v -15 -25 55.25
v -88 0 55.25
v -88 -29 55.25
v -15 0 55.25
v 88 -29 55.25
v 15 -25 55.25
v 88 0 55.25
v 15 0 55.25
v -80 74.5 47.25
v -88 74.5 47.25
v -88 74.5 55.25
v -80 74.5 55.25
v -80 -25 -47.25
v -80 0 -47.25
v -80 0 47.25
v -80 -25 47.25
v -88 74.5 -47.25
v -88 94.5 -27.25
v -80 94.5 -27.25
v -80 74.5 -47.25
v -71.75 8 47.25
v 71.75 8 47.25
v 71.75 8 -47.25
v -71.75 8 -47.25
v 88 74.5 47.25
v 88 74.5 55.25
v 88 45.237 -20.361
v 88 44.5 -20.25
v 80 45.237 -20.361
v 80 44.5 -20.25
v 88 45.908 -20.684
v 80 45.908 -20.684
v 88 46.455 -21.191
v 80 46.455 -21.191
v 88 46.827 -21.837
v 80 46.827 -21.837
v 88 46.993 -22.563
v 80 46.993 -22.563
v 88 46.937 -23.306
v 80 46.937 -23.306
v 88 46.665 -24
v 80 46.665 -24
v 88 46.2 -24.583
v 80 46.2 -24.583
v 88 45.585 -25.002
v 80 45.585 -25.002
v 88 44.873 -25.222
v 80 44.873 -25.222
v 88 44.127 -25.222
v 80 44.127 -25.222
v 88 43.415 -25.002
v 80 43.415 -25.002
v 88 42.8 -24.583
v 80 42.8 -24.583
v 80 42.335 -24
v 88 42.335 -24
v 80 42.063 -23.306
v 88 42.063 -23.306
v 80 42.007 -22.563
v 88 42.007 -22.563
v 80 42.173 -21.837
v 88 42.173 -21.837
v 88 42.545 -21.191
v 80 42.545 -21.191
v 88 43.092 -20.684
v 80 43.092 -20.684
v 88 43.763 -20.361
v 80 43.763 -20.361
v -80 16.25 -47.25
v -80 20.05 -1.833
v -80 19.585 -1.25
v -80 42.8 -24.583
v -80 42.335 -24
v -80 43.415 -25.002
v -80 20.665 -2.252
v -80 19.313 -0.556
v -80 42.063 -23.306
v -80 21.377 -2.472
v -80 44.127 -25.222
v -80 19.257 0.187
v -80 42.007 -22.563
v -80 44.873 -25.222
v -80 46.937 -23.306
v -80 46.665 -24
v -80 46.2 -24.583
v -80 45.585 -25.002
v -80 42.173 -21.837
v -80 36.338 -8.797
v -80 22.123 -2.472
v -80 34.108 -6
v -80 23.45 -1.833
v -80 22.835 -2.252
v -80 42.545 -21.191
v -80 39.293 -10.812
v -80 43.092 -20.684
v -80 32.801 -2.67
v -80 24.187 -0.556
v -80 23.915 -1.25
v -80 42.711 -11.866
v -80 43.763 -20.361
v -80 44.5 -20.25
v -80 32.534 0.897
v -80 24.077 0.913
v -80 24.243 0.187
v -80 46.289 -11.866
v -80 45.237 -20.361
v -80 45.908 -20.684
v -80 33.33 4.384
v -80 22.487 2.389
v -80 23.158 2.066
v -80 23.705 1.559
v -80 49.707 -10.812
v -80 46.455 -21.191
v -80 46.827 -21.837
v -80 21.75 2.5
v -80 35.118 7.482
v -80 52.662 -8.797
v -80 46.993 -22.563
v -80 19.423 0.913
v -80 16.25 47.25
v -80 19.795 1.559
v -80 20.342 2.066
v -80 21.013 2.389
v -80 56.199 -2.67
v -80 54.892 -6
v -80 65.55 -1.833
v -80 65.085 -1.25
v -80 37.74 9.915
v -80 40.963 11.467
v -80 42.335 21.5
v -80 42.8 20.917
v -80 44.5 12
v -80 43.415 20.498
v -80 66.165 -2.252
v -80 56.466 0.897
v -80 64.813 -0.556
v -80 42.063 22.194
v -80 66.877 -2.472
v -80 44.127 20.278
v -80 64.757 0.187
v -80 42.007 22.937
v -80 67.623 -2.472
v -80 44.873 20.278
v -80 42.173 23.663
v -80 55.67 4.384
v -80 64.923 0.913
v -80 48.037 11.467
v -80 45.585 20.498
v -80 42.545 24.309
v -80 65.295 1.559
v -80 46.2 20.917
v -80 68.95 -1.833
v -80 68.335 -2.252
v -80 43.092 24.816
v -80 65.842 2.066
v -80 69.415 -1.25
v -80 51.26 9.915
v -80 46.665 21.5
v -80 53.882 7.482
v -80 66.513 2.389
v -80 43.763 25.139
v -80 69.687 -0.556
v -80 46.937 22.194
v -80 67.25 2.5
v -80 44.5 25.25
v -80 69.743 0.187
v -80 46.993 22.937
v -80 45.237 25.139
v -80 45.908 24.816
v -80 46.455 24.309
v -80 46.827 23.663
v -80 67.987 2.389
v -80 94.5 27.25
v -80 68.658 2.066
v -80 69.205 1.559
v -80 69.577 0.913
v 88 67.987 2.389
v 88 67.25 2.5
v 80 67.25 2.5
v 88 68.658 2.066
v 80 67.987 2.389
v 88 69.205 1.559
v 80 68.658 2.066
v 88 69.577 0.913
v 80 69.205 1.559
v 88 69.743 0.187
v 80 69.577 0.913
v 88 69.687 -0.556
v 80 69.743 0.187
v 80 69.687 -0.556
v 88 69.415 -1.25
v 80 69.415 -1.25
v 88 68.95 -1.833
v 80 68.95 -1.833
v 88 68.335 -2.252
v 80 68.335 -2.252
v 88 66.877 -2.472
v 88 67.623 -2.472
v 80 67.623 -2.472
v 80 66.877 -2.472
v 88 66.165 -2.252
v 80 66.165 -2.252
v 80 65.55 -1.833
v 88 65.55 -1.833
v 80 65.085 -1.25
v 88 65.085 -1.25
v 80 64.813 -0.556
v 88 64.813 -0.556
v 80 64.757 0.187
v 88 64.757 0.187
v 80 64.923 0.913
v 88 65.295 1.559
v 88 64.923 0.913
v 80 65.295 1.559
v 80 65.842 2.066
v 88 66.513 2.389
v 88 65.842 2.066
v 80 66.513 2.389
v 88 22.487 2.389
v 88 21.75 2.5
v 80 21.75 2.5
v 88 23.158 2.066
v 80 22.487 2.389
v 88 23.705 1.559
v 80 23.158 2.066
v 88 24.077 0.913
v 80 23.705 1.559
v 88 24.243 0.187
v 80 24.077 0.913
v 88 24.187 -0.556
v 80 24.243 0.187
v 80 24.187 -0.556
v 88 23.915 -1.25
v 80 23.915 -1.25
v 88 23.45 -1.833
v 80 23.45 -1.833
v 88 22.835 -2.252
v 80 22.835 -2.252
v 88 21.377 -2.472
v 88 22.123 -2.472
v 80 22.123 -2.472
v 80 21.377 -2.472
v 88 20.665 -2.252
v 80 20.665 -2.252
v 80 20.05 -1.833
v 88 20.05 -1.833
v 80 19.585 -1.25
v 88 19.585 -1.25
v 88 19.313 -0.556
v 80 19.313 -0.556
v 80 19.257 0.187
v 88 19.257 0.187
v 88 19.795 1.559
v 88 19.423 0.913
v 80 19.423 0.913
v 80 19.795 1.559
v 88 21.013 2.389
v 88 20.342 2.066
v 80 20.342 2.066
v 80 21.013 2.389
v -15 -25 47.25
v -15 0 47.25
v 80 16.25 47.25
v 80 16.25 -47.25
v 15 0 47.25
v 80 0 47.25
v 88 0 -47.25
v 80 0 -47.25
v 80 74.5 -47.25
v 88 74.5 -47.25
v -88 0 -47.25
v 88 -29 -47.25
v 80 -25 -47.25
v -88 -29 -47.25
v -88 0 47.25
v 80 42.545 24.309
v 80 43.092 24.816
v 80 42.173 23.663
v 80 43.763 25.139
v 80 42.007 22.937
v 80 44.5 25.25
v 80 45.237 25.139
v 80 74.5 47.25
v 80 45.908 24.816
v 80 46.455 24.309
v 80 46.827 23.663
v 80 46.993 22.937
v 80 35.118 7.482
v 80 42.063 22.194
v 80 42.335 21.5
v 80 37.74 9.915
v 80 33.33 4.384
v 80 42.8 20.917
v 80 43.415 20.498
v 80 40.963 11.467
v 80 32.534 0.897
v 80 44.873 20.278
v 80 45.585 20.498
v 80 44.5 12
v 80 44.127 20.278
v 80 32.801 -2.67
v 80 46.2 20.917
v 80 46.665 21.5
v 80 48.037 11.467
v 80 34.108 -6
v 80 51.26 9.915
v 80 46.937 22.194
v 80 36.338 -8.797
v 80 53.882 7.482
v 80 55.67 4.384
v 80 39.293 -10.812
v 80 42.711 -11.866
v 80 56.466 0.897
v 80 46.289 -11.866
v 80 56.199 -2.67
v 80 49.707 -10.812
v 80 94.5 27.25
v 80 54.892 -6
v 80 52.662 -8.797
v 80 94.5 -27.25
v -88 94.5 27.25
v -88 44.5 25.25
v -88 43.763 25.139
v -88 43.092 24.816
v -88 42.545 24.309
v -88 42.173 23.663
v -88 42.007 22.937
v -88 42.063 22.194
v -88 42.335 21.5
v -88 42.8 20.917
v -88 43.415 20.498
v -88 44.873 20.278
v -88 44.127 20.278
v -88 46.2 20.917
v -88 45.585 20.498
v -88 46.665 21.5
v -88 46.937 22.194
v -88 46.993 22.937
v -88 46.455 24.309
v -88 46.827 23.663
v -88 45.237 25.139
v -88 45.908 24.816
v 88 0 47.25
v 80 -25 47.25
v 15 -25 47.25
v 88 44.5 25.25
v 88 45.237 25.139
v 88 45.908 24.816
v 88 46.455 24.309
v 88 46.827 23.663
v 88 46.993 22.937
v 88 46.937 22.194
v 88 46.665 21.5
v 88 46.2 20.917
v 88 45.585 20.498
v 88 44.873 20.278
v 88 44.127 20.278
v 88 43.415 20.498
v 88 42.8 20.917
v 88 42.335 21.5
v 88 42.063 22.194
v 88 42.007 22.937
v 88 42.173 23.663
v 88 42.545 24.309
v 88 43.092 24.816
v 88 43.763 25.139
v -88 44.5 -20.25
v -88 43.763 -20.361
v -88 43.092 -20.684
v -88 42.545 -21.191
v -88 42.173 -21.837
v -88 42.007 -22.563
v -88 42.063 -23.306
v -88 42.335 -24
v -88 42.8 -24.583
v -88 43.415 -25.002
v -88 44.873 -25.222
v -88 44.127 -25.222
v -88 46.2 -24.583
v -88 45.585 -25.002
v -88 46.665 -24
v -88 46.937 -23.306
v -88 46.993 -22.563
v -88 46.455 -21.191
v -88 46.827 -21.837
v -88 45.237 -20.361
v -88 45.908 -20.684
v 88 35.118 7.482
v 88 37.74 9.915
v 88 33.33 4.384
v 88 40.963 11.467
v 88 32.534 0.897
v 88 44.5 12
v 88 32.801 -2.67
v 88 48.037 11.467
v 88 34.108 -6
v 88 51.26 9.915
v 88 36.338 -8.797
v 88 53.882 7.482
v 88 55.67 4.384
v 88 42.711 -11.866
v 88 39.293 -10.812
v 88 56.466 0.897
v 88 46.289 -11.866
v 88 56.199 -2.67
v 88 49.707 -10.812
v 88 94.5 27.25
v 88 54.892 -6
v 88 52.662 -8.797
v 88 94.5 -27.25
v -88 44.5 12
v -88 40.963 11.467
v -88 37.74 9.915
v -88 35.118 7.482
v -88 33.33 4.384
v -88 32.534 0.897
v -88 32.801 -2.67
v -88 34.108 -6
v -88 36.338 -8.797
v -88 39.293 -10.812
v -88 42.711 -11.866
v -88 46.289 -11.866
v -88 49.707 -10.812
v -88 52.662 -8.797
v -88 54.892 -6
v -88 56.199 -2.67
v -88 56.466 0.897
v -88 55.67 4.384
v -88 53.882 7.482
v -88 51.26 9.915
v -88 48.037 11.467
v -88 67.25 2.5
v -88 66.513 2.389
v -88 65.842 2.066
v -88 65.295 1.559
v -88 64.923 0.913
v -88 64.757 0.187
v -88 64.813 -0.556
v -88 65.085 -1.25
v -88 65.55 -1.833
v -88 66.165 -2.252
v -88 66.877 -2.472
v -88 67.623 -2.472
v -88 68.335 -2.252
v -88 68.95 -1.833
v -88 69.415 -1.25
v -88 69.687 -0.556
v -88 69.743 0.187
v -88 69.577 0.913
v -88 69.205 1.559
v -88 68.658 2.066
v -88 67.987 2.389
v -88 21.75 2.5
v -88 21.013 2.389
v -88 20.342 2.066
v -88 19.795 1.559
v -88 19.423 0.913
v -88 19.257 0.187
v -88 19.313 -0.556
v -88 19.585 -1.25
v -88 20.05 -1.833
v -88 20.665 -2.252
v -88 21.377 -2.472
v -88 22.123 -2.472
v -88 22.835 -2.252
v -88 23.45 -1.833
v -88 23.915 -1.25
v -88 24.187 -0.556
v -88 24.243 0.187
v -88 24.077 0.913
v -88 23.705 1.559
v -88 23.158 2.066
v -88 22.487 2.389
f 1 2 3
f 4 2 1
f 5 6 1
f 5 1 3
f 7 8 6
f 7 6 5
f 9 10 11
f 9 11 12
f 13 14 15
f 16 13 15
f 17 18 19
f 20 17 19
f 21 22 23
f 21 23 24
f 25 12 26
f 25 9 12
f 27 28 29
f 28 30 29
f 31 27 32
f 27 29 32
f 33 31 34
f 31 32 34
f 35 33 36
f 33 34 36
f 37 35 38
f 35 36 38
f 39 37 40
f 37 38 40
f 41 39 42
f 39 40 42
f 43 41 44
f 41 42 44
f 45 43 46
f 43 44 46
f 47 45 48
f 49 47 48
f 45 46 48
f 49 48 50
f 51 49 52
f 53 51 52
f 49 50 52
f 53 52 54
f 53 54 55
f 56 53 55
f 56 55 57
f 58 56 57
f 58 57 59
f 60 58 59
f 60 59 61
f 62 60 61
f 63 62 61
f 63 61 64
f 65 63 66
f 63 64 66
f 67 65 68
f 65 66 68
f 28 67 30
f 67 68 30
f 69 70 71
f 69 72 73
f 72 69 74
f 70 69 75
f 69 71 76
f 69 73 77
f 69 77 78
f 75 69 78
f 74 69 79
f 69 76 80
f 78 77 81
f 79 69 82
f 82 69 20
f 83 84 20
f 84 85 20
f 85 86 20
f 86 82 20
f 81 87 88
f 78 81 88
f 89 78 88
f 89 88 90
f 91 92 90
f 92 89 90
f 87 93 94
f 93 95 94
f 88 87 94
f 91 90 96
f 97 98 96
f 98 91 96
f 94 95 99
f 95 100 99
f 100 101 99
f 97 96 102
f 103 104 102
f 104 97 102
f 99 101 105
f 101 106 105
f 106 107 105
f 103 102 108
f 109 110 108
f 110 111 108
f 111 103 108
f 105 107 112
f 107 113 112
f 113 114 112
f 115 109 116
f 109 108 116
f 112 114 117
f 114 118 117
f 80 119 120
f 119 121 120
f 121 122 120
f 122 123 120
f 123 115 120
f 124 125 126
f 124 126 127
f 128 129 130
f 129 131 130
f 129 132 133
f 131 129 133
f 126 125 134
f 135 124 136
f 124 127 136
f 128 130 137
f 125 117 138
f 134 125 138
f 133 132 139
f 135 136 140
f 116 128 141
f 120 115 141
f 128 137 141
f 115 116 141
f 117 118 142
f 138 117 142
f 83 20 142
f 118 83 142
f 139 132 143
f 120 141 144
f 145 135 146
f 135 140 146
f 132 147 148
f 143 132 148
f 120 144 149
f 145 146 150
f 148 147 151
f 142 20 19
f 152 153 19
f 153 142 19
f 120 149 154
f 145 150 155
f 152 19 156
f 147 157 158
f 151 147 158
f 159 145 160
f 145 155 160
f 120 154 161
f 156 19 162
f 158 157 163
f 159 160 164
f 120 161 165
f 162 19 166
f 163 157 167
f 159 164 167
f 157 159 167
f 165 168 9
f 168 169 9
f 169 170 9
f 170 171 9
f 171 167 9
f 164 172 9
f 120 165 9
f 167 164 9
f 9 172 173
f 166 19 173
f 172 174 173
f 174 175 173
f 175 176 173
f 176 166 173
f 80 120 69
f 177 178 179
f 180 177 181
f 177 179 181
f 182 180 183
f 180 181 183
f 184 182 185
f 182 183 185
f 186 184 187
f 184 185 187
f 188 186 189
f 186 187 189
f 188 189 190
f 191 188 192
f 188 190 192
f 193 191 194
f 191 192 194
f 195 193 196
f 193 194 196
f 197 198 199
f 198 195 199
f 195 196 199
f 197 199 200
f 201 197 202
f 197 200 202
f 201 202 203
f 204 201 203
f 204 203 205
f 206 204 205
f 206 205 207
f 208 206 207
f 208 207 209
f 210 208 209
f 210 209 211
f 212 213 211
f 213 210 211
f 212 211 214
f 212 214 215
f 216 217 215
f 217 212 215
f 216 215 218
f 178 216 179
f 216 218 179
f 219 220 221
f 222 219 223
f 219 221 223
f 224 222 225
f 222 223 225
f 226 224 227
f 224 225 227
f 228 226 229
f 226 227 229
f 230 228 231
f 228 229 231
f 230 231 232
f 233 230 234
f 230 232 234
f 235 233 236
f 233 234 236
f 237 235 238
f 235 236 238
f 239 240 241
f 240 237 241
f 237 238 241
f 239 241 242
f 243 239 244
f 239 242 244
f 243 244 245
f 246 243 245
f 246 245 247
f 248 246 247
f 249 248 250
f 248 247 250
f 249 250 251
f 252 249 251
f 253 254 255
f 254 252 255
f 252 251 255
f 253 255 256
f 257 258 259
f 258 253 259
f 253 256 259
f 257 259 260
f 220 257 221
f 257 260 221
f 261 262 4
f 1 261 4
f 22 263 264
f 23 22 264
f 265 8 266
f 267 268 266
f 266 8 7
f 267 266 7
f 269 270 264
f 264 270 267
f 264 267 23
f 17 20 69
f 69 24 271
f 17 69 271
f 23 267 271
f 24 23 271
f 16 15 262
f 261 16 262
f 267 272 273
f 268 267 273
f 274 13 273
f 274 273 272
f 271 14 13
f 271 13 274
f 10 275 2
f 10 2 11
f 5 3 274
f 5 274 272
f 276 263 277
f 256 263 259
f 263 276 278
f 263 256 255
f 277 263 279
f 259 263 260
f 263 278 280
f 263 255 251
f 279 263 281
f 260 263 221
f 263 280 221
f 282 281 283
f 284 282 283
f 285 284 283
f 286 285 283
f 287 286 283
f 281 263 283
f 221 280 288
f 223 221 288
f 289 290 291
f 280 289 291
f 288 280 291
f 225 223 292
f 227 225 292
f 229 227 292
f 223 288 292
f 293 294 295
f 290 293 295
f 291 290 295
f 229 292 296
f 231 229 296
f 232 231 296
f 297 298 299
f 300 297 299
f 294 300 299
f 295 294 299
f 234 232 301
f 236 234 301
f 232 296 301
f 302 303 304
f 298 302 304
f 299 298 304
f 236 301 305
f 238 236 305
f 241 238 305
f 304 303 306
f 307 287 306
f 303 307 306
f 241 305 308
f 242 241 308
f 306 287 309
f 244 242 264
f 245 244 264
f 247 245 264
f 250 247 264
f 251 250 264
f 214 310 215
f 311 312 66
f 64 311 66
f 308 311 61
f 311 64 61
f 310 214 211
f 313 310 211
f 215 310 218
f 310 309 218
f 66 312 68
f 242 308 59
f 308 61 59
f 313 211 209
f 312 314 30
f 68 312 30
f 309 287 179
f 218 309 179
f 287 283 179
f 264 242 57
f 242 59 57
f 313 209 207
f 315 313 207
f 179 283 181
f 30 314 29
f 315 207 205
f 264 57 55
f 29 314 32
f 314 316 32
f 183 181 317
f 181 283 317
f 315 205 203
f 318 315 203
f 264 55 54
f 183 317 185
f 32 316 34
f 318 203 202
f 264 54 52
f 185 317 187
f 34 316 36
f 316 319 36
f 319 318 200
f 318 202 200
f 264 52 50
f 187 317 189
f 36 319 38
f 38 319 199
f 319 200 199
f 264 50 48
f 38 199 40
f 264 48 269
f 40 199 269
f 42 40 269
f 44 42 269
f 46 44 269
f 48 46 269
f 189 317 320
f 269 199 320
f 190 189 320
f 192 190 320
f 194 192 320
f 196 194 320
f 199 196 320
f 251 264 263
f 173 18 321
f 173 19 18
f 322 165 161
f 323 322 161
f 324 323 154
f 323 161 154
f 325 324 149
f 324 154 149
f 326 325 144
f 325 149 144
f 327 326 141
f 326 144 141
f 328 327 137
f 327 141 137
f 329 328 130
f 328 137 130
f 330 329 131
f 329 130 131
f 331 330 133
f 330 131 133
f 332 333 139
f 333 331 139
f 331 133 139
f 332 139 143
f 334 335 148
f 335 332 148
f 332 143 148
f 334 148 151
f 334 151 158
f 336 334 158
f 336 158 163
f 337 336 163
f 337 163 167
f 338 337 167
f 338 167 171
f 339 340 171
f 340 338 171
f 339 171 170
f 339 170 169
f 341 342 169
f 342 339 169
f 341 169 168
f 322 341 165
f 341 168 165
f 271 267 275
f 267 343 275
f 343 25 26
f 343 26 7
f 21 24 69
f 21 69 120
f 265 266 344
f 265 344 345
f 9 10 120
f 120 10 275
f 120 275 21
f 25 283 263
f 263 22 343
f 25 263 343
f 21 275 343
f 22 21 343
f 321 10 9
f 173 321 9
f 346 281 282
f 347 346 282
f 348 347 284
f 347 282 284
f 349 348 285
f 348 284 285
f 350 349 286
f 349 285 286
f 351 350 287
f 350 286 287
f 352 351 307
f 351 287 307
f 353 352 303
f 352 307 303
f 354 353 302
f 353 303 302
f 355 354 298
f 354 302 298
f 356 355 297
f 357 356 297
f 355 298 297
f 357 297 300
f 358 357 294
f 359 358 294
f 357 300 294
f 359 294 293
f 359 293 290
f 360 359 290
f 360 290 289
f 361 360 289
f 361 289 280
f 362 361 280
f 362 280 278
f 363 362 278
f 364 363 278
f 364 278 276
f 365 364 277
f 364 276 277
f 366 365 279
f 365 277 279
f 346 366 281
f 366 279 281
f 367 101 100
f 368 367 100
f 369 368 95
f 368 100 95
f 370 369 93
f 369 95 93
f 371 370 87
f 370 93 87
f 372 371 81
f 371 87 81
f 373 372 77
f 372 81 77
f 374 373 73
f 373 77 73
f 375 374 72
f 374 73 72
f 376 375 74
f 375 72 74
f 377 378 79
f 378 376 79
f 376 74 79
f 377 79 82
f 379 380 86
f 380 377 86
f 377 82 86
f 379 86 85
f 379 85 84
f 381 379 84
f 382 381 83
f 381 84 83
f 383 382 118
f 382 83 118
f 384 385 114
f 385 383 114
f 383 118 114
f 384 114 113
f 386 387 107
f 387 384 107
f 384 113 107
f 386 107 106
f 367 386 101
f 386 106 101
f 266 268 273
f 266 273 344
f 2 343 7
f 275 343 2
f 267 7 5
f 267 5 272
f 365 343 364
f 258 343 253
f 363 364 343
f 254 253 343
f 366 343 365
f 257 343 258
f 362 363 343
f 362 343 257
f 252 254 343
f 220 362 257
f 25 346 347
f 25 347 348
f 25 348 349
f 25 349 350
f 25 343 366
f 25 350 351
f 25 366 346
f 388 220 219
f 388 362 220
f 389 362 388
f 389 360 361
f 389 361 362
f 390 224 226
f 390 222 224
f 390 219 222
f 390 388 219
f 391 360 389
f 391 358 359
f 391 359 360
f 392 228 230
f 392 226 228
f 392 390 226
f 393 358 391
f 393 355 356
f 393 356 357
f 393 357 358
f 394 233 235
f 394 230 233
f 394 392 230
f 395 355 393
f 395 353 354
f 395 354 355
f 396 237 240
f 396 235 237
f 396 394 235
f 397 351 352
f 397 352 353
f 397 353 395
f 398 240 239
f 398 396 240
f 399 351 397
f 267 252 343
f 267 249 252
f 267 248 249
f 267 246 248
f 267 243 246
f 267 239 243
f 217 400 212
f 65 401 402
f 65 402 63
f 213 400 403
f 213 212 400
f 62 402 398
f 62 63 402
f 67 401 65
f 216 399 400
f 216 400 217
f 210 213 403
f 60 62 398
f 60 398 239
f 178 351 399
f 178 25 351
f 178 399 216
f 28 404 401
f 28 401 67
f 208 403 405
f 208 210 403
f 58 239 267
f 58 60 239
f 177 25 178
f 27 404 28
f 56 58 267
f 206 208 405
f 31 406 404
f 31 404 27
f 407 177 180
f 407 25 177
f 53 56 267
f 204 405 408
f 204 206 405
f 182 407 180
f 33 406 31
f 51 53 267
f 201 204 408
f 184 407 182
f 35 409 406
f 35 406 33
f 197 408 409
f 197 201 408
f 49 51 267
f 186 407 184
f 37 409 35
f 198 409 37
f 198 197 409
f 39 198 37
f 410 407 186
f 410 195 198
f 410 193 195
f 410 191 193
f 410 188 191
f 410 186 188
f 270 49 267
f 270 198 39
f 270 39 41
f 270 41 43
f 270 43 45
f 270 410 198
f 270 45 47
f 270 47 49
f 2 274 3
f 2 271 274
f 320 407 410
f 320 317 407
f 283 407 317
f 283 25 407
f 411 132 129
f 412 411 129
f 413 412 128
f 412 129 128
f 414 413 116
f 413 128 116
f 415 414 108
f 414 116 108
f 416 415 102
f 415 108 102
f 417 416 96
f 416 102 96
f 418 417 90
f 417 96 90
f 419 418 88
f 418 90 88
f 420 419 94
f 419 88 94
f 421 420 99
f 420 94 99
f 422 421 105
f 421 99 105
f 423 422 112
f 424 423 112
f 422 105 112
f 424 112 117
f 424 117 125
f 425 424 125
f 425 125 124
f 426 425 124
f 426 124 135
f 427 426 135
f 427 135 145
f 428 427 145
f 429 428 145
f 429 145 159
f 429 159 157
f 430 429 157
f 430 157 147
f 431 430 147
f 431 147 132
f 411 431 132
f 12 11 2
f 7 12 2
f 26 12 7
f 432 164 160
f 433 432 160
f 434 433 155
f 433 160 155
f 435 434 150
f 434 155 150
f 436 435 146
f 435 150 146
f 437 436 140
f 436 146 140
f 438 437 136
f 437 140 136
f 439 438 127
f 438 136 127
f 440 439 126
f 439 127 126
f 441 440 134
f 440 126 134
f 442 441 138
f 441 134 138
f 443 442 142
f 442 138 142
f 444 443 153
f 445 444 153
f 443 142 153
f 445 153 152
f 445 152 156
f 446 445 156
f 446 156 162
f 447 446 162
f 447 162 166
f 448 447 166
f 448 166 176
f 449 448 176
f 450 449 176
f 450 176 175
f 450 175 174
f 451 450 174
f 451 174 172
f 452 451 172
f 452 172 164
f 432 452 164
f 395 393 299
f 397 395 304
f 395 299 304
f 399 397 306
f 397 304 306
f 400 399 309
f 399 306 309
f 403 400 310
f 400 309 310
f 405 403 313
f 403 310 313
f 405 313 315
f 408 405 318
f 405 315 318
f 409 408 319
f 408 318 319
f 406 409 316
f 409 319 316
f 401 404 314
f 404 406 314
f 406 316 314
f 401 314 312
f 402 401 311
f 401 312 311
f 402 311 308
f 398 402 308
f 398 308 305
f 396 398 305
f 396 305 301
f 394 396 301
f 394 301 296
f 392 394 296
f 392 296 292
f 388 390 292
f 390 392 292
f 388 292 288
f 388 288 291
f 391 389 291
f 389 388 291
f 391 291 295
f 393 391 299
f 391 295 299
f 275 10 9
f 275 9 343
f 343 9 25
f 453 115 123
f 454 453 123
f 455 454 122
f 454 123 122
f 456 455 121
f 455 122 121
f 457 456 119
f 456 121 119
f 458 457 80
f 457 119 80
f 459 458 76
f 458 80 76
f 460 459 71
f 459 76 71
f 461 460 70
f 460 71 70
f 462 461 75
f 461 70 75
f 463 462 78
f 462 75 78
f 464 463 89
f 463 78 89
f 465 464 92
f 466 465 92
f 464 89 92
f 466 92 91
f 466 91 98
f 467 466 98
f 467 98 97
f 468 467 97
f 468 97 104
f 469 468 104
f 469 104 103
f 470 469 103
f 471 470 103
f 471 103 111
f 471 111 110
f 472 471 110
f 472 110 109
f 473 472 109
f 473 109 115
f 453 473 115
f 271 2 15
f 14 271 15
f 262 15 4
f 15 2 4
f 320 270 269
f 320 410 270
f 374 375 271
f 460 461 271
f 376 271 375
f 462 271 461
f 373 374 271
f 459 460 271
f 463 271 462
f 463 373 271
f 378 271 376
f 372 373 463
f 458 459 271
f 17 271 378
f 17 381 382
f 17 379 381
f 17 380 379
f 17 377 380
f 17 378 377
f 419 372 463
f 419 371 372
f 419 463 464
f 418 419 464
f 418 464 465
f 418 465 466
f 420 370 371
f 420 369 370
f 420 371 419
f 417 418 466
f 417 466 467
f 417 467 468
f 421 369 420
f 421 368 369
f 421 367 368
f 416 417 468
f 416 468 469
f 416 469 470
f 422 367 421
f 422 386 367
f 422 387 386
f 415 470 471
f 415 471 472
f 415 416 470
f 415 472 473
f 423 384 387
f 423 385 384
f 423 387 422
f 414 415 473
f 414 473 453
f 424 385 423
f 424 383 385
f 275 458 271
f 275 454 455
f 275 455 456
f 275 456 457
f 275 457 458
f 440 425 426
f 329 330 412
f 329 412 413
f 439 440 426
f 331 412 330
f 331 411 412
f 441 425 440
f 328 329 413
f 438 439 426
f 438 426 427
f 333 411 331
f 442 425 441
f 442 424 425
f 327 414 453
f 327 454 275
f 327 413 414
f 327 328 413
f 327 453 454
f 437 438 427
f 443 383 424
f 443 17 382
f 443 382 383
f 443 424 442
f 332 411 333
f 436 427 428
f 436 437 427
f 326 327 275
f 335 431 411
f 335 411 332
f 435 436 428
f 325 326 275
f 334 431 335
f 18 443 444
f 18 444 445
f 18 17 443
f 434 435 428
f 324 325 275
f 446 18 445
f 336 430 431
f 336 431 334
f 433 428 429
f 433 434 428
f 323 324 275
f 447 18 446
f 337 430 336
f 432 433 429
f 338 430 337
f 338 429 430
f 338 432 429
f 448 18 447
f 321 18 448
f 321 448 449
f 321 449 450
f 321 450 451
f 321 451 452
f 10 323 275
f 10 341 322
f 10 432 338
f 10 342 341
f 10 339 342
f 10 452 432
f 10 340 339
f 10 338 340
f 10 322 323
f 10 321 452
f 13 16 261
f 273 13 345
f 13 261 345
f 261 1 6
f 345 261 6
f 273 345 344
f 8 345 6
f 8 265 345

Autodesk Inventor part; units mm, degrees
ref_plane "YZ Plane" through (0, 0, 0) normal (1, 0, 0) x (0, 1, 0)
ref_plane "XZ Plane" through (0, 0, 0) normal (0, 1, 0) x (-1, 0, 0)
ref_plane "XY Plane" through (0, 0, 0) normal (0, 0, 1) x (1, 0, 0)
sketch "Sketch1" plane through (0, 0, 0) normal (0, 1, 0) x (-1, 0, 0)
  line L0 (80, 47.25) -> (-80, 47.25)
  line L1 (-80, 47.25) -> (-80, -47.25)
  line L2 (-80, -47.25) -> (80, -47.25)
  line L3 (80, -47.25) -> (80, 47.25)
  line L4 (80, 47.25) -> (-80, -47.25) construction
  line L5 (-80, 47.25) -> (80, -47.25) construction
  point P0 (0, 0)
  dimension "d0" = 160
  dimension "d1" = 94.5
extrude "Extrusion1" add sketch "Sketch1" along normal blind 8
sketch "Sketch2" plane through (-80, 0, -47.25) normal (-1, 0, 0) x (0, 0, 1)
  line L0 (94.5, 0) -> (0, 0)
  line L1 (0, 0) -> (0, 94.5)
  line L2 (0, 94.5) -> (94.5, 94.5)
  line L3 (94.5, 94.5) -> (94.5, 0)
  line L4 (94.5, 0) -> (0, 94.5) construction
  line L5 (0, 0) -> (94.5, 94.5) construction
  line L6 (0, 0) -> (0, 8) projected
  line L7 (94.5, 0) -> (94.5, 8) projected
  line L8 (0, 0) -> (94.5, 0) projected
  line L9 (47.25, -18.9) -> (47.25, 113.4) projected
  line L10 (0, 8) -> (94.5, 8) projected
  circle A0 centre (47.25, 67.25) radius 2.5
  circle A1 centre (24.5, 44.5) radius 2.5
  circle A2 centre (47.25, 21.75) radius 2.5
  circle A3 centre (70, 44.5) radius 2.5
  circle A4 centre (47.25, 44.5) radius 12
  point P0 (47.25, 0)
  point P1 (47.25, 47.25)
  dimension "d4" = 94.5
  dimension "d7" = 36.5
  dimension "d10" = 360
  dimension "d12" = 5
  dimension "d13" = 22.75
  dimension "d14" = 24
extrude "Extrusion2" add sketch "Sketch2" along normal blind 8 contours L0 L9 L10 L3 | L0 L1 L10 L9 | L10 L9 A2 A4 A0 L2 L3 | L10 L1 L2 L9 A0 A4 A2
mirror "Mirror2" about plane through (0, 0, 0) normal (1, 0, 0) of "Extrusion2"
chamfer "Chamfer1" distance 20 angle 45 4 edges at (84, 94.5, 47.25) (84, 94.5, -47.25) (-84, 94.5, 47.25) (-84, 94.5, -47.25)
chamfer "Chamfer2" distance 8.25 angle 45 2 edges at (80, 8, 0) (-80, 8, 0)
sketch "Sketch4" plane through (-88, 0, 47.25) normal (0, 0, 1) x (1, 0, 0)
  line L0 (0, 74.5) -> (176, 74.5)
  line L1 (176, 74.5) -> (176, 0)
  line L2 (176, 0) -> (0, 0)
  line L3 (0, 0) -> (0, 74.5)
  line L4 (0, 74.5) -> (176, 0) construction
  line L5 (176, 74.5) -> (0, 0) construction
  line L6 (176, 0) -> (176, 74.5) projected
  line L7 (0, 0) -> (0, 74.5) projected
  line L8 (0, 0) -> (176, 0) projected
  line L9 (0, 74.5) -> (8, 74.5) projected
  point P0 (88, 0)
  point P1 (88, 37.25)
extrude "Extrusion3" add sketch "Sketch4" along normal blind 8 separate body
sketch "Sketch5" plane through (0, 0, 0) normal (0, -1, 0) x (1, 0, 0)
  line L0 (88, -47.25) -> (80, -47.25)
  line L1 (80, -47.25) -> (80, 47.25)
  line L2 (80, 47.25) -> (15, 47.25)
  line L3 (15, 47.25) -> (15, 55.25)
  line L4 (15, 55.25) -> (88, 55.25)
  line L5 (88, 55.25) -> (88, -47.25)
  line L6 (0, -67.75) -> (0, 75.75) projected
  line L7 (-88, -47.25) -> (-80, -47.25)
  line L8 (-80, -47.25) -> (-80, 47.25)
  line L9 (-80, 47.25) -> (-15, 47.25)
  line L10 (-15, 47.25) -> (-15, 55.25)
  line L11 (-15, 55.25) -> (-88, 55.25)
  line L12 (-88, 55.25) -> (-88, -47.25)
  line L13 (-88, -47.25) -> (-88, 55.25) projected
  line L14 (-88, 55.25) -> (88, 55.25) projected
  line L15 (-88, -47.25) -> (88, -47.25) projected
  point P0 (0, 0)
  dimension "d23" = 8
  dimension "d24" = 8
  dimension "d25" = 30
extrude "Extrusion4" add sketch "Sketch5" along normal blind 25 separate body contours L0 L1 L2 L3 L4 L5 | L7 L12 L11 L10 L9 L8
sketch "Sketch6" plane through (0, -25, 0) normal (0, -1, 0) x (1, 0, 0)
  line L0 (-15, 55.25) -> (-88, 55.25) projected
  line L1 (88, -47.25) -> (-88, -47.25)
  line L2 (-88, -47.25) -> (-88, 55.25)
  line L3 (-88, 55.25) -> (88, 55.25)
  line L4 (88, 55.25) -> (88, -47.25)
  line L5 (88, -47.25) -> (-88, 55.25) construction
  line L6 (-88, -47.25) -> (88, 55.25) construction
  line L7 (88, -47.25) -> (88, 55.25) projected
  line L8 (80, -47.25) -> (88, -47.25) projected
  point P0 (0, 0)
  point P1 (0, 4)
extrude "Extrusion5" add sketch "Sketch6" along normal blind 4 bodies 3
equation "\"d0\" = 2.5 * WO_BLDC"
equation "\"d1\" = 1.5 * DO_BLDC"
equation "\"d2\" = W_Wall"
equation "\"d4\" = 1.5 * DO_BLDC"
equation "\"d13\" = 0.5 * D_Hole_BLDC"
equation "\"d14\" = 3 * D_Shaft_BLDC"
equation "\"d5\" = W_Wall"
equation "\"d21\" = W_Wall"
equation "\"d23\" = W_Wall"
equation "\"d24\" = d23"
equation "\"d28\" = 0.5 * W_Wall"
equation "\"DO_BLDC\" = 63"
equation "\"WO_BLDC\" = 64"
equation "\"D_Shaft_BLDC\" = 8"
equation "\"D_Hole_BLDC\" = 45.5"
equation "\"W_Wall\" = 8"
equation "\"W_WheelOuter\" = 25"
equation "\"T_WheelToShaft\" = 0.3"
properties part number "Platform"
